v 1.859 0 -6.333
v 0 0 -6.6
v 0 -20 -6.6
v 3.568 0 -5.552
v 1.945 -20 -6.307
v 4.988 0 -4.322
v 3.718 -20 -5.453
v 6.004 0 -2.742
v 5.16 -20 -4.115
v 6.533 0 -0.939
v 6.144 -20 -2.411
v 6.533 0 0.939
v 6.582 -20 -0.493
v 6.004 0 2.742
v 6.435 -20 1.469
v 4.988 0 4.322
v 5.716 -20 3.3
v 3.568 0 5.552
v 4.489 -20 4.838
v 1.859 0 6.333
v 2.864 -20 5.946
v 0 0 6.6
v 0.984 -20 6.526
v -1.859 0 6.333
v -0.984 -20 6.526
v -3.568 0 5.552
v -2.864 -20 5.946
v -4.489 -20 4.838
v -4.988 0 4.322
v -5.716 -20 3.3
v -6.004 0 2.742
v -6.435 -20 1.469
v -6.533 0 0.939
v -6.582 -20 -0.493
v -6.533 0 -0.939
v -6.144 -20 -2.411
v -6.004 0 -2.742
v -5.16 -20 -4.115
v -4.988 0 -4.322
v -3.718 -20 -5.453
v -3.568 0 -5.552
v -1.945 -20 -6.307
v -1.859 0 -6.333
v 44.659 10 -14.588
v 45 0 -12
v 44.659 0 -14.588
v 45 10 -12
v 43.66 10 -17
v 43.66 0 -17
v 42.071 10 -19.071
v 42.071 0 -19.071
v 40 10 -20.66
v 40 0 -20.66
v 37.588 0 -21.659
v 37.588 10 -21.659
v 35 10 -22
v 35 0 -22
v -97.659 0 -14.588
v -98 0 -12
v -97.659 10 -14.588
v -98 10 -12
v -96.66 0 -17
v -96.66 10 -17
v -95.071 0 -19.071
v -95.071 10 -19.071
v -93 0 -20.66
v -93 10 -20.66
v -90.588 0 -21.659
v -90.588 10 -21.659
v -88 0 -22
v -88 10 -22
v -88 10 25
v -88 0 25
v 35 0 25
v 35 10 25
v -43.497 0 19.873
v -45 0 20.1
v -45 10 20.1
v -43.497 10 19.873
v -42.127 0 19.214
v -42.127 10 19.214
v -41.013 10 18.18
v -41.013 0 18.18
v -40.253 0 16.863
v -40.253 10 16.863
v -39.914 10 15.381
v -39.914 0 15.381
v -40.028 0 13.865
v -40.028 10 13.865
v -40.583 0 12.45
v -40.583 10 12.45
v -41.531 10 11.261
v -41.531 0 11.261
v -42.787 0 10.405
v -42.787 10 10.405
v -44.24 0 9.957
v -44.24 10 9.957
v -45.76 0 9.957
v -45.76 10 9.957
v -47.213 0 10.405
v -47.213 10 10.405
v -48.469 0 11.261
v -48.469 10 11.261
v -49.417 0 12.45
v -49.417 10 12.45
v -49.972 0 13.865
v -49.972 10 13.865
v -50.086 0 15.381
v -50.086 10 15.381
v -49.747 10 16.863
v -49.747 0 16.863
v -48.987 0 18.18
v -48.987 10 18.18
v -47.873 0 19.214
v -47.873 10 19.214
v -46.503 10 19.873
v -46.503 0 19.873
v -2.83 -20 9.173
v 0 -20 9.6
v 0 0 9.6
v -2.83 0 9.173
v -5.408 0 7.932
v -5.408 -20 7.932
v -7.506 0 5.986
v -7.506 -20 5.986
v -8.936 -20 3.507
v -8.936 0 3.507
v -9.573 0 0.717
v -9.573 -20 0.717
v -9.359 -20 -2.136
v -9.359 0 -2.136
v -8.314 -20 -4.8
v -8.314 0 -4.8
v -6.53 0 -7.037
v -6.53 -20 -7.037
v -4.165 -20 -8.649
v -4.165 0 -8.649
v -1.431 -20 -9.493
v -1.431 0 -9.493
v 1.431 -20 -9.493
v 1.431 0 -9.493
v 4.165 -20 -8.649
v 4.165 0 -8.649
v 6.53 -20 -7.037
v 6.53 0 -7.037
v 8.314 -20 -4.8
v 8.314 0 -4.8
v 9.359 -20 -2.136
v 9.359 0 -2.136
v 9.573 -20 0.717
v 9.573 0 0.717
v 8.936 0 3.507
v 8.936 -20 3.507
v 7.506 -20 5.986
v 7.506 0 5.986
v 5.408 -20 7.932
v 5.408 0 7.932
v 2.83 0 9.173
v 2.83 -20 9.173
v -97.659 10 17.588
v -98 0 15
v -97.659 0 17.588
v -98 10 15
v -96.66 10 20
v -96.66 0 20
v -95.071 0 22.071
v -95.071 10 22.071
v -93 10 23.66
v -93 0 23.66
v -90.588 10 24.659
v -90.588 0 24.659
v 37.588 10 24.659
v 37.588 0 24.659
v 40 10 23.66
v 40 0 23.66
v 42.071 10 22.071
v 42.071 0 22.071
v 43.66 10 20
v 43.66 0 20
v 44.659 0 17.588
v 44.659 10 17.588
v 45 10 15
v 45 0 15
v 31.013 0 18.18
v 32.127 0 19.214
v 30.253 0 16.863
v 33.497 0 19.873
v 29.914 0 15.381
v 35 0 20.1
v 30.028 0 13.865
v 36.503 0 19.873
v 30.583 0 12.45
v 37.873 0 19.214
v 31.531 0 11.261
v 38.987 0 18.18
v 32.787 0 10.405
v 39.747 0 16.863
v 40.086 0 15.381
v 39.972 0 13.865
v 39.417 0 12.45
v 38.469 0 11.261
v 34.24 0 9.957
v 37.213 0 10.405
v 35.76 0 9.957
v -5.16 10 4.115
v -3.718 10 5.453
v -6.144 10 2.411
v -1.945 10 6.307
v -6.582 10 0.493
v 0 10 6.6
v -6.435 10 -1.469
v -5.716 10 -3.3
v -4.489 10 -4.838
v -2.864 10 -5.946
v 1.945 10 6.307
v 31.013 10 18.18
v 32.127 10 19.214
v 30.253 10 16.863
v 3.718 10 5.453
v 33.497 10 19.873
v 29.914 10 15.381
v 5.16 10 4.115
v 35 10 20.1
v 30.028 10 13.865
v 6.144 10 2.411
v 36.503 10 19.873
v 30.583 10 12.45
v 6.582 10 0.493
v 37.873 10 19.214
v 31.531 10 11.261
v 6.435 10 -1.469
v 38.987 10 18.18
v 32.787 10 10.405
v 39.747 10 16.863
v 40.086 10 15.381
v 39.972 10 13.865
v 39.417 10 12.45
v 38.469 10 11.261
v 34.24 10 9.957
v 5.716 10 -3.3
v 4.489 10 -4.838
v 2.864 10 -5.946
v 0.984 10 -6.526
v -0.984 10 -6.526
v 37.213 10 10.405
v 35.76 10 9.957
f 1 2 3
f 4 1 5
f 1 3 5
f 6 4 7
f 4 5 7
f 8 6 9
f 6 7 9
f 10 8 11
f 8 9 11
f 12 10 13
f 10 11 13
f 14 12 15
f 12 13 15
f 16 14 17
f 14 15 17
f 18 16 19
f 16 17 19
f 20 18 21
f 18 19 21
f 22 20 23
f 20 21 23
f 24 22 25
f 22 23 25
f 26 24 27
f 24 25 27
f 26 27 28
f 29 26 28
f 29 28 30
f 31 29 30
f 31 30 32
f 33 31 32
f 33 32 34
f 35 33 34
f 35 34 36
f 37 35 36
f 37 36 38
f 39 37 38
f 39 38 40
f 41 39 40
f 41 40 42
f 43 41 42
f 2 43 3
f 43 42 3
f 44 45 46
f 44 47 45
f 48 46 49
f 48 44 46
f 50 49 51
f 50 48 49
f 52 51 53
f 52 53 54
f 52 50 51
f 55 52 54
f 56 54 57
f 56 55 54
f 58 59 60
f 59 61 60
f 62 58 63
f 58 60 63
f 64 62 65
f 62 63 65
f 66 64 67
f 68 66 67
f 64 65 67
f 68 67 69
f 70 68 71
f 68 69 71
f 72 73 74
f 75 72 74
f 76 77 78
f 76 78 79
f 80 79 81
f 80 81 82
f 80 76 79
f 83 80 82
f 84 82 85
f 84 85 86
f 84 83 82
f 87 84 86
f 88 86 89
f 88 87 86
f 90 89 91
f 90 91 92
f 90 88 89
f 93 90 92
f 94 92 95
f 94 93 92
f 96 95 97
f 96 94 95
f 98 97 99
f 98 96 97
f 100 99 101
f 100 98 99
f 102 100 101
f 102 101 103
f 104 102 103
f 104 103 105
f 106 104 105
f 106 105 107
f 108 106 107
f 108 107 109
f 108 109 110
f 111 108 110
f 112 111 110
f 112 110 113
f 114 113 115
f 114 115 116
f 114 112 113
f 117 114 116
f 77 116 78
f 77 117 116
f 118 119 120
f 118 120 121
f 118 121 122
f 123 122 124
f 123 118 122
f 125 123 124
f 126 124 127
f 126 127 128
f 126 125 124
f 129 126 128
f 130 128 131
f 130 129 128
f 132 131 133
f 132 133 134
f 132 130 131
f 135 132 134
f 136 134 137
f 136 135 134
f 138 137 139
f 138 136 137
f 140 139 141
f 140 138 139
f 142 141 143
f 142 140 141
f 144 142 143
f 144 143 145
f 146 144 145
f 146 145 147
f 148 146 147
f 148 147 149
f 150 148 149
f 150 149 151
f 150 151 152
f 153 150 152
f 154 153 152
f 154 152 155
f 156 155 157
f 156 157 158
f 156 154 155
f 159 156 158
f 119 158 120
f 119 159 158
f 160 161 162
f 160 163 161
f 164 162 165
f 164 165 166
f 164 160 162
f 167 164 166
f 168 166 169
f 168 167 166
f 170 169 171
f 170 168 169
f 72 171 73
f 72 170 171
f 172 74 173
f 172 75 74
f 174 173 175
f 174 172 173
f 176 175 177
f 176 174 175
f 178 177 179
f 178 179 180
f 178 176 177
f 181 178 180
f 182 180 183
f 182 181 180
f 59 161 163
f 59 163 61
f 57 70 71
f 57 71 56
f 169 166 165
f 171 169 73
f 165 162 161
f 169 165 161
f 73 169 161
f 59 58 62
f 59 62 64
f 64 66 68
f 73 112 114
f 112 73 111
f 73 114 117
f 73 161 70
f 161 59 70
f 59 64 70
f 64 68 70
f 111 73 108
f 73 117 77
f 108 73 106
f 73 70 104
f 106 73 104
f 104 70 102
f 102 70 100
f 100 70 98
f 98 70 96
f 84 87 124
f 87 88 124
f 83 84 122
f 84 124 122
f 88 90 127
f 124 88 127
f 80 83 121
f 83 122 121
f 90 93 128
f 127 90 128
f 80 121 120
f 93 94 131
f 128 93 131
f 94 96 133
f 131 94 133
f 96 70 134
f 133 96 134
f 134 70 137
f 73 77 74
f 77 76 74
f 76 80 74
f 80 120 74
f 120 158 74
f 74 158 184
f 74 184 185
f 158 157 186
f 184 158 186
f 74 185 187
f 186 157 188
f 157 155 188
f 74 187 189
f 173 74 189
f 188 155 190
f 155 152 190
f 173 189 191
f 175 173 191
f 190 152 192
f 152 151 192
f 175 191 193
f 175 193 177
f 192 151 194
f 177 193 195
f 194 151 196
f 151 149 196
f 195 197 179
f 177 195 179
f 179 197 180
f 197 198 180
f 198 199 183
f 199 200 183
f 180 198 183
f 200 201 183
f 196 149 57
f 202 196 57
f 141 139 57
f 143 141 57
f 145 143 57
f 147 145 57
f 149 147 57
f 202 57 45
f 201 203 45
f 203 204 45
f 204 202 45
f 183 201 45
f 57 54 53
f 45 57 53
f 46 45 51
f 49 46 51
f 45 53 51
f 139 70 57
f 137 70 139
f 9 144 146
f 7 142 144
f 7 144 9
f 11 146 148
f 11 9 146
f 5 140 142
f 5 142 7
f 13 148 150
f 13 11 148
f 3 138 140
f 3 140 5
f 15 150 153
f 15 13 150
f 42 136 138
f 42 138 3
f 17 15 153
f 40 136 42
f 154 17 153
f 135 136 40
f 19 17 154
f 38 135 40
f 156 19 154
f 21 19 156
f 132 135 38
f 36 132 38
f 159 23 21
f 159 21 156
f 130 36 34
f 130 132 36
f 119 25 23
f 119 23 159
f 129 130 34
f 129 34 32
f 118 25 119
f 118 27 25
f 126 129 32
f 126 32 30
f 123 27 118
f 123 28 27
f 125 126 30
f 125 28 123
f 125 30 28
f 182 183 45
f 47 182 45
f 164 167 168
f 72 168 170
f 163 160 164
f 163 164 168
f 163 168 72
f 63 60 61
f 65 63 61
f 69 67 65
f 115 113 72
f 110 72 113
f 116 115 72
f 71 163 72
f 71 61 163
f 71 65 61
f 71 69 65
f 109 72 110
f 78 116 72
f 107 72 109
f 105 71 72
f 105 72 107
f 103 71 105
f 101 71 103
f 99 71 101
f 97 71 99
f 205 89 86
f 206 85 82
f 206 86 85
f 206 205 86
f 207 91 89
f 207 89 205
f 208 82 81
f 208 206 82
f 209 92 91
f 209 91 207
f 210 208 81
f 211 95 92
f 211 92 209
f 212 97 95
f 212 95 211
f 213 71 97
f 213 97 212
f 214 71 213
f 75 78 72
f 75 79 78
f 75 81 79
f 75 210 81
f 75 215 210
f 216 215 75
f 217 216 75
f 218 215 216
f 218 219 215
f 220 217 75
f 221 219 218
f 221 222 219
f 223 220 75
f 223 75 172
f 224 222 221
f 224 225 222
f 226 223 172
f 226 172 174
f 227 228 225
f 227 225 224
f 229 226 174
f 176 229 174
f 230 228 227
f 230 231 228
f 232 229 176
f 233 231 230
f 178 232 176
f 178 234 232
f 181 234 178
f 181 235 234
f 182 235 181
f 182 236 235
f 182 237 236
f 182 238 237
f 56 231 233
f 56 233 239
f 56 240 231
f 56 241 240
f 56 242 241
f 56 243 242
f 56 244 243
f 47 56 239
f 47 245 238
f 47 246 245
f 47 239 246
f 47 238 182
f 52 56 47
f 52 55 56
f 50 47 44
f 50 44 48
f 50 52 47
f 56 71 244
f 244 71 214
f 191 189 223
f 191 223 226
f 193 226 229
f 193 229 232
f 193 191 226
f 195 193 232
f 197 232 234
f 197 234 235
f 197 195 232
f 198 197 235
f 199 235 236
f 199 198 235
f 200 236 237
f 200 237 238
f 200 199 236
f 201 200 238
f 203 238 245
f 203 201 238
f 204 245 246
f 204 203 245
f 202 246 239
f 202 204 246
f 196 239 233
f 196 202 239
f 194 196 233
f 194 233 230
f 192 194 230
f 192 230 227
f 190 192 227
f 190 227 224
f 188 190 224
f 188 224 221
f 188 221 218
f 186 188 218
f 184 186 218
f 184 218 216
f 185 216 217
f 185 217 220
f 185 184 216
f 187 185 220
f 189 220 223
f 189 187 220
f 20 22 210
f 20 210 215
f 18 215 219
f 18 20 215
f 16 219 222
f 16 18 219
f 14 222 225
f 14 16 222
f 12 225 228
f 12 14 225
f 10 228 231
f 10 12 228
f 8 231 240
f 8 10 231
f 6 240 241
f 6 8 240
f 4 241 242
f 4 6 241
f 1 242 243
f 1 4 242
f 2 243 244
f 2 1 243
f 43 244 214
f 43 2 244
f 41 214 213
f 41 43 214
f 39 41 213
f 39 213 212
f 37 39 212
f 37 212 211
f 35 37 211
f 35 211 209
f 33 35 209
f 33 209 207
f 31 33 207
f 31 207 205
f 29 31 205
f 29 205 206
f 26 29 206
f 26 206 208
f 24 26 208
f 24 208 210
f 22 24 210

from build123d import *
from build123d.topology import SkipClean

# Parameters (mm, degrees)
SKETCH1_W           = 143
SKETCH1_H           = 47
SKETCH1_R           = 6.6
SKETCH1_R_2         = 5.1
BOSS_EXTRUDE1_DEPTH = 10
FILLET1_R           = 10
FILLET2_R           = 10
FILLET3_R           = 10
FILLET4_R           = 10
BOSS_EXTRUDE2_START = 20
SKETCH2_R           = 9.6
SKETCH2_R_2         = 6.6
BOSS_EXTRUDE2_DEPTH = 20


with BuildPart() as part:
    # Sketch1 → Boss-Extrude1 (new body)
    with BuildSketch(Plane(origin=(0, 0, 0), x_dir=(1, 0, 0), z_dir=(0, 1, 0))):
        with Locations((-26.5, -1.5)):
            Rectangle(SKETCH1_W, SKETCH1_H)
        with Locations(Location((0, 0, 0), (0, 0, 270))):
            Circle(SKETCH1_R, mode=Mode.SUBTRACT)
        with Locations(Location((-45, -15, 0), (0, 0, 270))):
            Circle(SKETCH1_R_2, mode=Mode.SUBTRACT)
        with Locations(Location((35, -15, 0), (0, 0, 270))):
            Circle(SKETCH1_R_2, mode=Mode.SUBTRACT)
    extrude(amount=BOSS_EXTRUDE1_DEPTH)

    # Fillet1
    fillet1_edges = [part.edges().sort_by_distance(p)[0] for p in [
        (-98, 5, -22),
    ]]
    fillet(fillet1_edges, radius=FILLET1_R)

    # Fillet2
    fillet2_edges = [part.edges().sort_by_distance(p)[0] for p in [
        (-98, 5, 25),
    ]]
    fillet(fillet2_edges, radius=FILLET2_R)

    # Fillet3
    fillet3_edges = [part.edges().sort_by_distance(p)[0] for p in [
        (45, 5, 25),
    ]]
    fillet(fillet3_edges, radius=FILLET3_R)

    # Fillet4
    fillet4_edges = [part.edges().sort_by_distance(p)[0] for p in [
        (45, 5, -22),
    ]]
    fillet(fillet4_edges, radius=FILLET4_R)

    # Sketch2 → Boss-Extrude2 (add)
    with SkipClean():  # the faces are left unmerged after this step: merging them gives an invalid solid
        with BuildSketch(Plane.XZ.offset(BOSS_EXTRUDE2_START)):
            with Locations(Location((0, 0, 0), (0, 0, 90))):
                Circle(SKETCH2_R)
            with Locations(Location((0, 0, 0), (0, 0, 270))):
                Circle(SKETCH2_R_2, mode=Mode.SUBTRACT)
        extrude(amount=-BOSS_EXTRUDE2_DEPTH)


solid = part.part
